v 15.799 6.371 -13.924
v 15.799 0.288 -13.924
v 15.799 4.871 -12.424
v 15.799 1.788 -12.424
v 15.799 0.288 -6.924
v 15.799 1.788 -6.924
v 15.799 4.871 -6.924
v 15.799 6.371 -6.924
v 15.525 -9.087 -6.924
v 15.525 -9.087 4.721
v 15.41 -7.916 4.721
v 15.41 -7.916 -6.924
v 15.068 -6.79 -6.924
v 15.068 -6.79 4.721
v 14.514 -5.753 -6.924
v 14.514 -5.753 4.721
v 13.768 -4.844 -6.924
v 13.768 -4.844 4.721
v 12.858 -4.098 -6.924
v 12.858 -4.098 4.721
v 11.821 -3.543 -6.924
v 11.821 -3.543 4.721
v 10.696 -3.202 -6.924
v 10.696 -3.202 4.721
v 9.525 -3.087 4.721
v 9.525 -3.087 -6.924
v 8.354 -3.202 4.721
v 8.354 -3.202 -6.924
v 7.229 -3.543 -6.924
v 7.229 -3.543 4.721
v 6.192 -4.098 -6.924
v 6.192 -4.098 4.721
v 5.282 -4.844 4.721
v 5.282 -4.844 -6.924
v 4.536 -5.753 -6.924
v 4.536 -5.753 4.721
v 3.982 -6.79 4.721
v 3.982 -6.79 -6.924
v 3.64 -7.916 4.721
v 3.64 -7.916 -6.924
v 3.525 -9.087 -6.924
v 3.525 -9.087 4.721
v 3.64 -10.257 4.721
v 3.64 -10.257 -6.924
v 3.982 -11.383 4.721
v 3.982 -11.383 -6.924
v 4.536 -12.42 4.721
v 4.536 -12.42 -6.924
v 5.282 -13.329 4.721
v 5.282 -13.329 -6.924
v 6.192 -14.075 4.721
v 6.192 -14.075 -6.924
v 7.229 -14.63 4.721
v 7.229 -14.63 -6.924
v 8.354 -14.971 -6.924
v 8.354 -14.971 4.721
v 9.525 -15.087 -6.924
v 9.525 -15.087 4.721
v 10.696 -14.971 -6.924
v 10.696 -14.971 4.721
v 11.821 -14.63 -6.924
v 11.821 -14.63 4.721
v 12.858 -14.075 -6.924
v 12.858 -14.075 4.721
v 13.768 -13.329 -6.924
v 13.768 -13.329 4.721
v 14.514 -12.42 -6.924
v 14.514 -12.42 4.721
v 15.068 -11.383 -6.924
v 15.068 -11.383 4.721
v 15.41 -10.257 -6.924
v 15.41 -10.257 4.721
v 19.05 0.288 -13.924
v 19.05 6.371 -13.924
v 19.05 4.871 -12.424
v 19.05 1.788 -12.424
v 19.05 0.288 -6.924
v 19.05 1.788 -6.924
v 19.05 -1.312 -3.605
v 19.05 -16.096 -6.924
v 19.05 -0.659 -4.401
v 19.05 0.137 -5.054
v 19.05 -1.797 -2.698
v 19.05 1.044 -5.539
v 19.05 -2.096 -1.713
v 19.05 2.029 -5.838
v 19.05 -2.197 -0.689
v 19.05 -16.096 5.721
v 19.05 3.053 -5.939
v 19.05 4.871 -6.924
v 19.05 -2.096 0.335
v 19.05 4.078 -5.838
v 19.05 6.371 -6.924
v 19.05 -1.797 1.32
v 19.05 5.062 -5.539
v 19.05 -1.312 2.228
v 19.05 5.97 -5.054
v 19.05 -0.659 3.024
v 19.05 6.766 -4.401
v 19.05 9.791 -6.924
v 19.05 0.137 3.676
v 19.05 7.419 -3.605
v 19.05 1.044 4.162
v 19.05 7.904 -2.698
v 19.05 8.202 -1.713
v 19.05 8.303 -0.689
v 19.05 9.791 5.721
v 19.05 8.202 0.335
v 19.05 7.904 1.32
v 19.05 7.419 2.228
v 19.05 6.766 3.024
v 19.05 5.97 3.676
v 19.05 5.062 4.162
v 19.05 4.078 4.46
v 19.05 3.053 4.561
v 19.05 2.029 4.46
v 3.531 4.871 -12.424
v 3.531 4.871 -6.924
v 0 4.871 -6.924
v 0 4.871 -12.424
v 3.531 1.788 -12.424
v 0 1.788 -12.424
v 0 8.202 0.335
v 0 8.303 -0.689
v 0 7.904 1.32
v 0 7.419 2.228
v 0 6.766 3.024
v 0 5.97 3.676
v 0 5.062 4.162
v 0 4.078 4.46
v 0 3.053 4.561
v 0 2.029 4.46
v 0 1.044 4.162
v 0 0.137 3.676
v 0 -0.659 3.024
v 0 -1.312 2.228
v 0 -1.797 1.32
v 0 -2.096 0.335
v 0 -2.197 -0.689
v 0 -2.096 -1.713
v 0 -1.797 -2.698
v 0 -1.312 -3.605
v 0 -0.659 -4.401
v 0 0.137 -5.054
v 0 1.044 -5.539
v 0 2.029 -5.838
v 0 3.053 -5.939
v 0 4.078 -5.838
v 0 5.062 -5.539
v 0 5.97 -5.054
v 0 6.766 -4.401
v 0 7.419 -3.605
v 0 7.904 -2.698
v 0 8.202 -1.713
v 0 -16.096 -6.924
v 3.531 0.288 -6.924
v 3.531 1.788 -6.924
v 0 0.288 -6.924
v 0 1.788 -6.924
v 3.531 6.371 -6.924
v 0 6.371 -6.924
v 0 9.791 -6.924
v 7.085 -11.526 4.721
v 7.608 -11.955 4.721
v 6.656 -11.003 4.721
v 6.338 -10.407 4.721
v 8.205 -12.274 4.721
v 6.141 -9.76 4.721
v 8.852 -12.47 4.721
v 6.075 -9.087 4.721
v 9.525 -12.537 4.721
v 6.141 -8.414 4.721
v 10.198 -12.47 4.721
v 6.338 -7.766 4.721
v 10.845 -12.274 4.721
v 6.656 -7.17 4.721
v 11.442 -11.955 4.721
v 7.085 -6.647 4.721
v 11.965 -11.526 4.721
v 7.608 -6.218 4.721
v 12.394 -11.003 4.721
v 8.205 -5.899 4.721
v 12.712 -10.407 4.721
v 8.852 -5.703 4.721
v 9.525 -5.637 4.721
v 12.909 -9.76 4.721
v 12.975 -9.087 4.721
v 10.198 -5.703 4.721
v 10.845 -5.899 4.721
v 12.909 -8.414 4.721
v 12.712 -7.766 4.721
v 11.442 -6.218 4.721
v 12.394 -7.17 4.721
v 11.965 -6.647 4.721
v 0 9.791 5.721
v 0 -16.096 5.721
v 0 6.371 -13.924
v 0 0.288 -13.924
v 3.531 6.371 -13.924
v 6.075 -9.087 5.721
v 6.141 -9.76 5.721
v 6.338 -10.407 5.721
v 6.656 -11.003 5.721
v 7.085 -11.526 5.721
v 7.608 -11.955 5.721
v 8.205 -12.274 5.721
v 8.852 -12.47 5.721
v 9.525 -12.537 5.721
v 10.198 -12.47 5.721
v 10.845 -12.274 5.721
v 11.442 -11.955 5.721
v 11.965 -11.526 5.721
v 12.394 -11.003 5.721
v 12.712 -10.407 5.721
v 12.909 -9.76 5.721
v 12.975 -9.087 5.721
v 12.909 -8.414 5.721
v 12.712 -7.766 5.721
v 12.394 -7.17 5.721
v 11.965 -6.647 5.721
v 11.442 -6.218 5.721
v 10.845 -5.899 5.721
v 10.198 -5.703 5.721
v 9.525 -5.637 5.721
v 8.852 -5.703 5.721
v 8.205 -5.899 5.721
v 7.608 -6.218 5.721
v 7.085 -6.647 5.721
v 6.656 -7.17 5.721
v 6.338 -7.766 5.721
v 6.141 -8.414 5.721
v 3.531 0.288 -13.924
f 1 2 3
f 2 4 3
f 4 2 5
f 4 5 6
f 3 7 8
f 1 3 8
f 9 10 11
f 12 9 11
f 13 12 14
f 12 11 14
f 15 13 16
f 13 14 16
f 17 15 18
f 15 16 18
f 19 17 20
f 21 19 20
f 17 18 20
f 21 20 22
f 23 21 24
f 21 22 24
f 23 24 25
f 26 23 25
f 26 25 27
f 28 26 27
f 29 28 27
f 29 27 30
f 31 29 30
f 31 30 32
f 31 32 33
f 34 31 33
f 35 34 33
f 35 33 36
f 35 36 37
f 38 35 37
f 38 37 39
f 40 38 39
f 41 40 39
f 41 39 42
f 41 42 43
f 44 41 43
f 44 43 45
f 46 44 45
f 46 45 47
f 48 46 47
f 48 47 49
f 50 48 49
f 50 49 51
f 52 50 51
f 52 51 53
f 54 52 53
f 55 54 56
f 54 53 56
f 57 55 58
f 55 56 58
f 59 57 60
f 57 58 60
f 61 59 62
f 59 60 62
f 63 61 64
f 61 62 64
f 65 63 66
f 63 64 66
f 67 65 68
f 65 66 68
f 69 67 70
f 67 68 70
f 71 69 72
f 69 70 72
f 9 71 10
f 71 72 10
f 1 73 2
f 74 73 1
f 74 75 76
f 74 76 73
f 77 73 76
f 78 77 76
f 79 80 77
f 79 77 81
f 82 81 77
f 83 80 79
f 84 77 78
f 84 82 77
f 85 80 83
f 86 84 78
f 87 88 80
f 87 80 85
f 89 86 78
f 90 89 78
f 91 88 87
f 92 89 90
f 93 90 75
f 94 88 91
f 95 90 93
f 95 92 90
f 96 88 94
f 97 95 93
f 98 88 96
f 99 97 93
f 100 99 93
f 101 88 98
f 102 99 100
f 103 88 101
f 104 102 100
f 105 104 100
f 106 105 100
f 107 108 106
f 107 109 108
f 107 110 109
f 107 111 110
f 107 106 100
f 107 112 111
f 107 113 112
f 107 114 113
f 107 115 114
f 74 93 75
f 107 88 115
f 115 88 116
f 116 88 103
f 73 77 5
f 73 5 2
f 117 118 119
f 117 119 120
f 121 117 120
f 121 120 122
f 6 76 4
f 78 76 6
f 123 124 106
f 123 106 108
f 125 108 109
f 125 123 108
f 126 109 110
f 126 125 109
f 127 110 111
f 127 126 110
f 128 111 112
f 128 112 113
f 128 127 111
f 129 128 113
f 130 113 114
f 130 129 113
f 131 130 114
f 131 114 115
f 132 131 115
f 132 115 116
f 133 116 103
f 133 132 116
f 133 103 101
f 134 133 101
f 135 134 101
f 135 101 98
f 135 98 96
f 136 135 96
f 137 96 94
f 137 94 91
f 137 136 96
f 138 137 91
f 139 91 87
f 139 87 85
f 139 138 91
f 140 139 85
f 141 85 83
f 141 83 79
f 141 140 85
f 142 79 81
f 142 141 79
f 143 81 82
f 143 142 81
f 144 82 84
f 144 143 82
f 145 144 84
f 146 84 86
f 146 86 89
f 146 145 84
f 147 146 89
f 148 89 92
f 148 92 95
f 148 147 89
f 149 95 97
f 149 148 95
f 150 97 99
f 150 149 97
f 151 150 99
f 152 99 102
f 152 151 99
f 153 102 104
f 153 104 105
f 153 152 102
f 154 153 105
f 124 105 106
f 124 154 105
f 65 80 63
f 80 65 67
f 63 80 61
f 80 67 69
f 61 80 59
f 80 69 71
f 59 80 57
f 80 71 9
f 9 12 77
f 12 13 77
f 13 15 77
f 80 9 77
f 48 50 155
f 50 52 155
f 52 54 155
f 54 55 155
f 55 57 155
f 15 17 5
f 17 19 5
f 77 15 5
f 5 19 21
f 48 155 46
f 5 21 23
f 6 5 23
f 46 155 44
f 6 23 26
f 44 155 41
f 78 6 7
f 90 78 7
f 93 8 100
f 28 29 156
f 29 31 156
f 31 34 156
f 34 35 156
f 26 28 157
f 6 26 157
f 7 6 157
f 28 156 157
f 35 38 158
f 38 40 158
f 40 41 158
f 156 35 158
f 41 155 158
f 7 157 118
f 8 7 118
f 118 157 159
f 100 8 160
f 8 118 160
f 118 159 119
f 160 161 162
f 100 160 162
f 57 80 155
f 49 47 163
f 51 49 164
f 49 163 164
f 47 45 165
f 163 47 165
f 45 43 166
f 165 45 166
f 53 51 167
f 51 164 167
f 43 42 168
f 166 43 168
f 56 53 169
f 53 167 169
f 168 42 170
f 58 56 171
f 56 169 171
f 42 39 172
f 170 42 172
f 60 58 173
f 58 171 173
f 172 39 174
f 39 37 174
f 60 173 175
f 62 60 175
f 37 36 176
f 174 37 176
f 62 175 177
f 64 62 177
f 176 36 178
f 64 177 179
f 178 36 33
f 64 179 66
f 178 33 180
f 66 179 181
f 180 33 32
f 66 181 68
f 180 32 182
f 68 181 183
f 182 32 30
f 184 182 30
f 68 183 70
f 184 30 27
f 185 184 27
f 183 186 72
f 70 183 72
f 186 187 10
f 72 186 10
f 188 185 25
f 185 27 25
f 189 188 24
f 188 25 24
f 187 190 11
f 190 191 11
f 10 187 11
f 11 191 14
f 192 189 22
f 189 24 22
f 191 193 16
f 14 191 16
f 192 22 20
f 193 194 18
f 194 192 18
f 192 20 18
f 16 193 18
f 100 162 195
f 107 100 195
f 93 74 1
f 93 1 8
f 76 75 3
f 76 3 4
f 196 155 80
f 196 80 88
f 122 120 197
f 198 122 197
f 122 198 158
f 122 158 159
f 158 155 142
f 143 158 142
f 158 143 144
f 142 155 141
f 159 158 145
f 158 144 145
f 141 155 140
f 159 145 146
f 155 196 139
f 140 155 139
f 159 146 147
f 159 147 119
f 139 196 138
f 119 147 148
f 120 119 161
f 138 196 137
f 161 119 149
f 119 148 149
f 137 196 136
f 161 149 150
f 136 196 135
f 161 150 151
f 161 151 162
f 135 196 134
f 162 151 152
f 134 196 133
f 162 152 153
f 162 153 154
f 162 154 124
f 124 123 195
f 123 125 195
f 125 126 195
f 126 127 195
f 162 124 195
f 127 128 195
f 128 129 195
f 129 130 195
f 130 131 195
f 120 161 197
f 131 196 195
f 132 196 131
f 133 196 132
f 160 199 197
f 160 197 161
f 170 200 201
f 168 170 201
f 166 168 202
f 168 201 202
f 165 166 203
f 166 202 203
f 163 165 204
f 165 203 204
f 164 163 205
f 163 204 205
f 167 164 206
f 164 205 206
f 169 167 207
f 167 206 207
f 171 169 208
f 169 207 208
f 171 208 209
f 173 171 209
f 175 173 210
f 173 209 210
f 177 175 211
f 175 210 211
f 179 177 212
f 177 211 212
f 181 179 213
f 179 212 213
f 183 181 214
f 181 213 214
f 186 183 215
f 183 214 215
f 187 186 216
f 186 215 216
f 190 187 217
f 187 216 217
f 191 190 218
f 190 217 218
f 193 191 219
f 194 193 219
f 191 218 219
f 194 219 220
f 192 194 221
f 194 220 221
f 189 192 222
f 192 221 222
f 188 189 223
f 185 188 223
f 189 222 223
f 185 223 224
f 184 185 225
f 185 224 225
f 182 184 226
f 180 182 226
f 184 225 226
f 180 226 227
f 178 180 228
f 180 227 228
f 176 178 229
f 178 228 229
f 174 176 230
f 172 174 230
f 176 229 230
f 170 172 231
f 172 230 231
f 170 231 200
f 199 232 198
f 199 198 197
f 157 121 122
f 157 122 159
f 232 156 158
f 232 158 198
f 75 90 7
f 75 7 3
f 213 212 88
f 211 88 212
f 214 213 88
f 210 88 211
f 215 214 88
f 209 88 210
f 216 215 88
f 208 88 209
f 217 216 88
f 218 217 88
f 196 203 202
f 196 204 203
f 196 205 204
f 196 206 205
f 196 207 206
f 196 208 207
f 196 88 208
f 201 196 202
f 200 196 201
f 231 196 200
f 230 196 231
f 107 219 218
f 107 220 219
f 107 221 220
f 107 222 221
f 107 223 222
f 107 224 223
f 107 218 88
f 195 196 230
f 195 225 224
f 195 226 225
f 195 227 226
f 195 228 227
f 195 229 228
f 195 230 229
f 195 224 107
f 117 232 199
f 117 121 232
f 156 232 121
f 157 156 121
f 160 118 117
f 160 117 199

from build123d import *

# Parameters (mm, degrees)
F0_W     = 25.8862247349
F0_H     = 12.6448004093
F0_R     = 5.25
F1_DEPTH = 19.05
F3_DEPTH = 1
F4_START = -1
F4_DEPTH = 24.4
F6_DEPTH = 3.2512
F7_START = -15.5194
F7_DEPTH = 3.5306


with BuildPart() as f1:
    # F0 (on Right) → F1 (new body)
    with BuildSketch(Plane.YZ):
        with Locations((-3.152461024, -0.6018574079)):
            Rectangle(F0_W, F0_H)
        with Locations((3.0532879755, -0.688746688)):
            Circle(F0_R, mode=Mode.SUBTRACT)
    extrude(amount=F1_DEPTH)

    # F2 (on face) → F3 (cut)
    with BuildSketch(Plane.XY.offset(5.7205427967)):
        with BuildLine():
            Line((9.525, -9.0865883976), (12.975, -9.0865883976))
            ThreePointArc((12.975, -9.0865883976), (9.525, -5.6365883976), (6.075, -9.0865883976))
            Line((6.075, -9.0865883976), (9.525, -9.0865883976))
        make_face()
        with BuildLine():
            ThreePointArc((6.075, -9.0865883976), (9.525, -12.5365883976), (12.975, -9.0865883976))
            Line((12.975, -9.0865883976), (9.525, -9.0865883976))
            Line((9.525, -9.0865883976), (6.075, -9.0865883976))
        make_face()
    extrude(amount=-F3_DEPTH, mode=Mode.SUBTRACT)

    # F2 (on face) → F4 (cut)
    with BuildSketch(Plane.XY.offset(5.7205427967).offset(F4_START)):
        with BuildLine():
            Line((15.525, -9.0865883976), (12.975, -9.0865883976))
            ThreePointArc((12.975, -9.0865883976), (9.525, -12.5365883976), (6.075, -9.0865883976))
            Line((6.075, -9.0865883976), (3.525, -9.0865883976))
            ThreePointArc((3.525, -9.0865883976), (9.525, -15.0865883976), (15.525, -9.0865883976))
        make_face()
        with BuildLine():
            Line((9.525, -9.0865883976), (12.975, -9.0865883976))
            ThreePointArc((12.975, -9.0865883976), (9.525, -5.6365883976), (6.075, -9.0865883976))
            Line((6.075, -9.0865883976), (9.525, -9.0865883976))
        make_face()
        with BuildLine():
            ThreePointArc((6.075, -9.0865883976), (9.525, -5.6365883976), (12.975, -9.0865883976))
            Line((12.975, -9.0865883976), (15.525, -9.0865883976))
            ThreePointArc((15.525, -9.0865883976), (9.525, -3.0865883976), (3.525, -9.0865883976))
            Line((3.525, -9.0865883976), (6.075, -9.0865883976))
        make_face()
        with BuildLine():
            ThreePointArc((6.075, -9.0865883976), (9.525, -12.5365883976), (12.975, -9.0865883976))
            Line((12.975, -9.0865883976), (9.525, -9.0865883976))
            Line((9.525, -9.0865883976), (6.075, -9.0865883976))
        make_face()
    extrude(amount=-F4_DEPTH, mode=Mode.SUBTRACT)

    # F5 (on face) → F6 (join)
    with BuildSketch(Plane.YZ.offset(19.05)):
        Polygon((6.3707139343, -13.9242576137), (6.3707139343, -6.9242576137), (4.8707139343, -6.9242576126), (4.8707139343, -12.4242576137), (1.7881980821, -12.4242576137), (1.7881980821, -6.9242576137), (0.2881980821, -6.9242576126), (0.2881980821, -13.9242576137), align=None)
    extrude(amount=-F6_DEPTH)

    # F5 (on face) → F7 (join)
    with BuildSketch(Plane.YZ.offset(19.05).offset(F7_START)):
        Polygon((6.3707139343, -13.9242576137), (6.3707139343, -6.9242576137), (4.8707139343, -6.9242576126), (4.8707139343, -12.4242576137), (1.7881980821, -12.4242576137), (1.7881980821, -6.9242576137), (0.2881980821, -6.9242576126), (0.2881980821, -13.9242576137), align=None)
    extrude(amount=-F7_DEPTH)


solid = f1.part
